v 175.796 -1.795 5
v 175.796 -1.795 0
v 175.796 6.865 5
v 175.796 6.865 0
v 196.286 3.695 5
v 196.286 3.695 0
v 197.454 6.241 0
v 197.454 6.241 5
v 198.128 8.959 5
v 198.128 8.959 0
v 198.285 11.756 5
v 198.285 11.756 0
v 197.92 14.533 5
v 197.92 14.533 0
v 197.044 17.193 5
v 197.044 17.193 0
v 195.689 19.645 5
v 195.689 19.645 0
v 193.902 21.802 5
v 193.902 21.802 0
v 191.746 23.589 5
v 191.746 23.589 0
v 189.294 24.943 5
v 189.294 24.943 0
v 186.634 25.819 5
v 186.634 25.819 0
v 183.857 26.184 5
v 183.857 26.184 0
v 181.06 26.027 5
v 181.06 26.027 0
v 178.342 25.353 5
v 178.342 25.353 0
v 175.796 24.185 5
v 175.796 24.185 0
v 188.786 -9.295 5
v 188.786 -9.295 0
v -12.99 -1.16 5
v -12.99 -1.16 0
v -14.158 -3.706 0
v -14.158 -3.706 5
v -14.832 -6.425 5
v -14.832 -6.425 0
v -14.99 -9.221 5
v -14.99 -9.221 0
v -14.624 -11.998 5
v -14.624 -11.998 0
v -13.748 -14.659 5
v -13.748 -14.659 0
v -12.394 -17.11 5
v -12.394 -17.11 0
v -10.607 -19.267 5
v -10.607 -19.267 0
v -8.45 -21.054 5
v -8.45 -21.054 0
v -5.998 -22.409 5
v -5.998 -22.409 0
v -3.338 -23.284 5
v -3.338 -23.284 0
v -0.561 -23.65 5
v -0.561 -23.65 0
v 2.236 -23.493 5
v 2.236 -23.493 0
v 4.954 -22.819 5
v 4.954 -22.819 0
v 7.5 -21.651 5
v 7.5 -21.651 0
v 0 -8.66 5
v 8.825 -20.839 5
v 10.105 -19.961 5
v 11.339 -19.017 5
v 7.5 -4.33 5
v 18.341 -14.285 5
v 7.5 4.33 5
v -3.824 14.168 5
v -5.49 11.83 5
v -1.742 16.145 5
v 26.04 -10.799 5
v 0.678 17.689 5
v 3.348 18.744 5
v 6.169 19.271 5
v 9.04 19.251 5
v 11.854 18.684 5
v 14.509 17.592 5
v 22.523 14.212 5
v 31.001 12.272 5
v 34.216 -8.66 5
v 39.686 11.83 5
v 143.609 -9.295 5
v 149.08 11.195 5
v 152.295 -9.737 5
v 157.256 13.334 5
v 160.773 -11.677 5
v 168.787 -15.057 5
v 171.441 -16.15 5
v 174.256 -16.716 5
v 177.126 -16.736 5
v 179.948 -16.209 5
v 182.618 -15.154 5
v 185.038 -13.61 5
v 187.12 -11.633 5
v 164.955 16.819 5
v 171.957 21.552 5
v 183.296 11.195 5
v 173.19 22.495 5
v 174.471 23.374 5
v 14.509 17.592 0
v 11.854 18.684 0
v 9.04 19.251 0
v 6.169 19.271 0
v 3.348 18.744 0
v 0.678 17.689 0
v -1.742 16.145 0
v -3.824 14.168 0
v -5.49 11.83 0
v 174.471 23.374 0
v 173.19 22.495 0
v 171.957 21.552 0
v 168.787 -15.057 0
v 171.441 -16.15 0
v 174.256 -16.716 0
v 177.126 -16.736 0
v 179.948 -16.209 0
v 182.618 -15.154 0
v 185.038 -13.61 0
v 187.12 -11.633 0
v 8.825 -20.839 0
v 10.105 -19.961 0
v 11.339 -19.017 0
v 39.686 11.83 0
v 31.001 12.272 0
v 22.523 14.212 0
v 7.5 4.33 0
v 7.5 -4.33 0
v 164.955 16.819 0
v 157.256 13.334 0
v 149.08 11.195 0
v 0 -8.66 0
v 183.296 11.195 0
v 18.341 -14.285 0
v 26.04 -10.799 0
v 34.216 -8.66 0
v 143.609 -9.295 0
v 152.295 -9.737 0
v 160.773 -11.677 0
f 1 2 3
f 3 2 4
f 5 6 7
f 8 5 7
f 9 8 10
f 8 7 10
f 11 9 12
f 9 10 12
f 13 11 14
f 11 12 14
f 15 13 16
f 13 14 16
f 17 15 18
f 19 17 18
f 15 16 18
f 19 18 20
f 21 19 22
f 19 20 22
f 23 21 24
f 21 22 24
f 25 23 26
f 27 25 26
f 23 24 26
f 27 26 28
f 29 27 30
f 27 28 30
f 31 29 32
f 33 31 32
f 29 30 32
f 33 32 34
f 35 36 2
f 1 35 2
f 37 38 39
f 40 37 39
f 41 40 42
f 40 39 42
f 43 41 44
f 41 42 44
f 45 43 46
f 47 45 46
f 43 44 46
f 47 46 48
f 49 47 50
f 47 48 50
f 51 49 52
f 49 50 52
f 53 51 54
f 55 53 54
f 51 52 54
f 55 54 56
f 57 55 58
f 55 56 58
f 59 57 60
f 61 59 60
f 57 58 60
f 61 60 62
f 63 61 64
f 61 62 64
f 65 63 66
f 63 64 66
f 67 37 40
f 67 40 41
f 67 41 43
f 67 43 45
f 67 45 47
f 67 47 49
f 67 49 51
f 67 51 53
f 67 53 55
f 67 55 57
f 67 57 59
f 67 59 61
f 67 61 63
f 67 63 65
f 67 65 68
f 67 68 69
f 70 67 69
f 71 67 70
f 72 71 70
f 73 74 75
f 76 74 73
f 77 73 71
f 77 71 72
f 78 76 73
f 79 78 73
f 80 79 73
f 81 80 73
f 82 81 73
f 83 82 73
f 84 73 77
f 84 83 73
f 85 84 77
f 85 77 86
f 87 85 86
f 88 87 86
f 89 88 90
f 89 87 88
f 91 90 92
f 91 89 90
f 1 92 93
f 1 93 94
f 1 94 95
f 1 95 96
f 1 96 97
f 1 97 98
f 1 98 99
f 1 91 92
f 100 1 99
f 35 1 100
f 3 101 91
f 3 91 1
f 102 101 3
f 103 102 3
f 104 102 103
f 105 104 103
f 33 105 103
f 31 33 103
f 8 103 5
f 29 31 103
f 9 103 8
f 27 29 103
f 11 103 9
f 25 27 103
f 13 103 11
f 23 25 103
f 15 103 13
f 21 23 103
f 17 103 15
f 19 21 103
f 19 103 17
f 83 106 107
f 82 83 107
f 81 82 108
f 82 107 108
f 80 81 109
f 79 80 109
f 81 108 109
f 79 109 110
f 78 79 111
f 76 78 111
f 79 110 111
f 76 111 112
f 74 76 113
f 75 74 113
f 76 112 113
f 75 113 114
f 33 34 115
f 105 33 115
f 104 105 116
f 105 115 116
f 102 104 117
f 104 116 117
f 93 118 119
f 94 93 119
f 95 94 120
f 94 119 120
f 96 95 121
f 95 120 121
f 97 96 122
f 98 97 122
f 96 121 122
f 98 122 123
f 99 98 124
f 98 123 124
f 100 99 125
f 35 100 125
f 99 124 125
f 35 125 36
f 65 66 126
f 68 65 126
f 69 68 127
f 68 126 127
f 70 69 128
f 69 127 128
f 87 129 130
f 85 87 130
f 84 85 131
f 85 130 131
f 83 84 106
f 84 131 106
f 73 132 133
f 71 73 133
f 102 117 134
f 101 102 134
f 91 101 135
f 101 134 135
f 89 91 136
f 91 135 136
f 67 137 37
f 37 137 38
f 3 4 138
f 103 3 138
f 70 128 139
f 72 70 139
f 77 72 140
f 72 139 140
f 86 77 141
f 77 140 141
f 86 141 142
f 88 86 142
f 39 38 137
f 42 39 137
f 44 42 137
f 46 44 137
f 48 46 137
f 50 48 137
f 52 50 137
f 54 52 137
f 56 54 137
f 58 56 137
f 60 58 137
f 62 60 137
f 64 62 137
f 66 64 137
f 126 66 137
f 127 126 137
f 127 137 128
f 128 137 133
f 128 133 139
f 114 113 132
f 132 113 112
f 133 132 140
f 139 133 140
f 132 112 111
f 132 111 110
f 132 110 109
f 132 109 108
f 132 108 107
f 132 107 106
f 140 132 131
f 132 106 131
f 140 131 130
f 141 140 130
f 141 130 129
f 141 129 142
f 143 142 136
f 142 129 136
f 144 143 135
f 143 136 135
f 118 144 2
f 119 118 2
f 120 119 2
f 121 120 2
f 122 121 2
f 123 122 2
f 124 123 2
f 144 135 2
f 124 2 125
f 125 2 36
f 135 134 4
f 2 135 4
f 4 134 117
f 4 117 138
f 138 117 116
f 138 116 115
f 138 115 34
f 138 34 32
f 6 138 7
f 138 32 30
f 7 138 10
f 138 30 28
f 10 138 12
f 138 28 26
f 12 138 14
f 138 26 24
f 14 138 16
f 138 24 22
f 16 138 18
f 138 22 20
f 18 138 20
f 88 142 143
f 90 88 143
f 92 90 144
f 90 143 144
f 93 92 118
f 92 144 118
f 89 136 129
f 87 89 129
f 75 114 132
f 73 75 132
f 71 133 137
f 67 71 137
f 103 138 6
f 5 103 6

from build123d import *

# Parameters (mm, degrees)
BOSS_EXTRUDE1_DEPTH = 5


with BuildPart() as part:
    # Sketch1 → Boss-Extrude1 (new body)
    with BuildSketch(Plane.XY):
        with BuildLine():
            Line((7.5, 4.330127019), (7.5, -4.330127019))
            Line((7.5, -4.330127019), (0, -8.660254038))
            Line((0, -8.660254038), (-12.990381057, -1.160254038))
            ThreePointArc((-12.990381057, -1.160254038), (-10.606601718, -19.266855756), (7.5, -21.650635095))
            ThreePointArc((7.5, -21.650635095), (9.470749841, -20.408378389), (11.339164993, -19.016946938))
            ThreePointArc((11.339164993, -19.016946938), (22.116918375, -12.378980702), (34.216242145, -8.660254038))
            Line((34.216242145, -8.660254038), (143.609407991, -9.295451439))
            ThreePointArc((143.609407991, -9.295451439), (156.576488353, -10.522513679), (168.786666574, -15.057092233))
            ThreePointArc((168.786666574, -15.057092233), (179.94830651, -16.20923796), (188.786247547, -9.295451439))
            Line((188.786247547, -9.295451439), (175.79586649, -1.795451439))
            Line((175.79586649, -1.795451439), (175.79586649, 6.864802599))
            Line((175.79586649, 6.864802599), (183.29586649, 11.194929618))
            Line((183.29586649, 11.194929618), (196.286247547, 3.694929618))
            ThreePointArc((196.286247547, 3.694929618), (193.902468208, 21.801531335), (175.79586649, 24.185310674))
            ThreePointArc((175.79586649, 24.185310674), (173.82511705, 22.943054244), (171.956702255, 21.55162313))
            ThreePointArc((171.956702255, 21.55162313), (161.178948559, 14.913656483), (149.079624345, 11.194929618))
            Line((149.079624345, 11.194929618), (39.686458499, 11.830127019))
            ThreePointArc((39.686458499, 11.830127019), (26.719378137, 13.057189259), (14.509199916, 17.591767813))
            ThreePointArc((14.509199916, 17.591767813), (3.34755998, 18.74391354), (-5.490381057, 11.830127019))
            Line((-5.490381057, 11.830127019), (7.5, 4.330127019))
        make_face()
    extrude(amount=BOSS_EXTRUDE1_DEPTH)


solid = part.part
